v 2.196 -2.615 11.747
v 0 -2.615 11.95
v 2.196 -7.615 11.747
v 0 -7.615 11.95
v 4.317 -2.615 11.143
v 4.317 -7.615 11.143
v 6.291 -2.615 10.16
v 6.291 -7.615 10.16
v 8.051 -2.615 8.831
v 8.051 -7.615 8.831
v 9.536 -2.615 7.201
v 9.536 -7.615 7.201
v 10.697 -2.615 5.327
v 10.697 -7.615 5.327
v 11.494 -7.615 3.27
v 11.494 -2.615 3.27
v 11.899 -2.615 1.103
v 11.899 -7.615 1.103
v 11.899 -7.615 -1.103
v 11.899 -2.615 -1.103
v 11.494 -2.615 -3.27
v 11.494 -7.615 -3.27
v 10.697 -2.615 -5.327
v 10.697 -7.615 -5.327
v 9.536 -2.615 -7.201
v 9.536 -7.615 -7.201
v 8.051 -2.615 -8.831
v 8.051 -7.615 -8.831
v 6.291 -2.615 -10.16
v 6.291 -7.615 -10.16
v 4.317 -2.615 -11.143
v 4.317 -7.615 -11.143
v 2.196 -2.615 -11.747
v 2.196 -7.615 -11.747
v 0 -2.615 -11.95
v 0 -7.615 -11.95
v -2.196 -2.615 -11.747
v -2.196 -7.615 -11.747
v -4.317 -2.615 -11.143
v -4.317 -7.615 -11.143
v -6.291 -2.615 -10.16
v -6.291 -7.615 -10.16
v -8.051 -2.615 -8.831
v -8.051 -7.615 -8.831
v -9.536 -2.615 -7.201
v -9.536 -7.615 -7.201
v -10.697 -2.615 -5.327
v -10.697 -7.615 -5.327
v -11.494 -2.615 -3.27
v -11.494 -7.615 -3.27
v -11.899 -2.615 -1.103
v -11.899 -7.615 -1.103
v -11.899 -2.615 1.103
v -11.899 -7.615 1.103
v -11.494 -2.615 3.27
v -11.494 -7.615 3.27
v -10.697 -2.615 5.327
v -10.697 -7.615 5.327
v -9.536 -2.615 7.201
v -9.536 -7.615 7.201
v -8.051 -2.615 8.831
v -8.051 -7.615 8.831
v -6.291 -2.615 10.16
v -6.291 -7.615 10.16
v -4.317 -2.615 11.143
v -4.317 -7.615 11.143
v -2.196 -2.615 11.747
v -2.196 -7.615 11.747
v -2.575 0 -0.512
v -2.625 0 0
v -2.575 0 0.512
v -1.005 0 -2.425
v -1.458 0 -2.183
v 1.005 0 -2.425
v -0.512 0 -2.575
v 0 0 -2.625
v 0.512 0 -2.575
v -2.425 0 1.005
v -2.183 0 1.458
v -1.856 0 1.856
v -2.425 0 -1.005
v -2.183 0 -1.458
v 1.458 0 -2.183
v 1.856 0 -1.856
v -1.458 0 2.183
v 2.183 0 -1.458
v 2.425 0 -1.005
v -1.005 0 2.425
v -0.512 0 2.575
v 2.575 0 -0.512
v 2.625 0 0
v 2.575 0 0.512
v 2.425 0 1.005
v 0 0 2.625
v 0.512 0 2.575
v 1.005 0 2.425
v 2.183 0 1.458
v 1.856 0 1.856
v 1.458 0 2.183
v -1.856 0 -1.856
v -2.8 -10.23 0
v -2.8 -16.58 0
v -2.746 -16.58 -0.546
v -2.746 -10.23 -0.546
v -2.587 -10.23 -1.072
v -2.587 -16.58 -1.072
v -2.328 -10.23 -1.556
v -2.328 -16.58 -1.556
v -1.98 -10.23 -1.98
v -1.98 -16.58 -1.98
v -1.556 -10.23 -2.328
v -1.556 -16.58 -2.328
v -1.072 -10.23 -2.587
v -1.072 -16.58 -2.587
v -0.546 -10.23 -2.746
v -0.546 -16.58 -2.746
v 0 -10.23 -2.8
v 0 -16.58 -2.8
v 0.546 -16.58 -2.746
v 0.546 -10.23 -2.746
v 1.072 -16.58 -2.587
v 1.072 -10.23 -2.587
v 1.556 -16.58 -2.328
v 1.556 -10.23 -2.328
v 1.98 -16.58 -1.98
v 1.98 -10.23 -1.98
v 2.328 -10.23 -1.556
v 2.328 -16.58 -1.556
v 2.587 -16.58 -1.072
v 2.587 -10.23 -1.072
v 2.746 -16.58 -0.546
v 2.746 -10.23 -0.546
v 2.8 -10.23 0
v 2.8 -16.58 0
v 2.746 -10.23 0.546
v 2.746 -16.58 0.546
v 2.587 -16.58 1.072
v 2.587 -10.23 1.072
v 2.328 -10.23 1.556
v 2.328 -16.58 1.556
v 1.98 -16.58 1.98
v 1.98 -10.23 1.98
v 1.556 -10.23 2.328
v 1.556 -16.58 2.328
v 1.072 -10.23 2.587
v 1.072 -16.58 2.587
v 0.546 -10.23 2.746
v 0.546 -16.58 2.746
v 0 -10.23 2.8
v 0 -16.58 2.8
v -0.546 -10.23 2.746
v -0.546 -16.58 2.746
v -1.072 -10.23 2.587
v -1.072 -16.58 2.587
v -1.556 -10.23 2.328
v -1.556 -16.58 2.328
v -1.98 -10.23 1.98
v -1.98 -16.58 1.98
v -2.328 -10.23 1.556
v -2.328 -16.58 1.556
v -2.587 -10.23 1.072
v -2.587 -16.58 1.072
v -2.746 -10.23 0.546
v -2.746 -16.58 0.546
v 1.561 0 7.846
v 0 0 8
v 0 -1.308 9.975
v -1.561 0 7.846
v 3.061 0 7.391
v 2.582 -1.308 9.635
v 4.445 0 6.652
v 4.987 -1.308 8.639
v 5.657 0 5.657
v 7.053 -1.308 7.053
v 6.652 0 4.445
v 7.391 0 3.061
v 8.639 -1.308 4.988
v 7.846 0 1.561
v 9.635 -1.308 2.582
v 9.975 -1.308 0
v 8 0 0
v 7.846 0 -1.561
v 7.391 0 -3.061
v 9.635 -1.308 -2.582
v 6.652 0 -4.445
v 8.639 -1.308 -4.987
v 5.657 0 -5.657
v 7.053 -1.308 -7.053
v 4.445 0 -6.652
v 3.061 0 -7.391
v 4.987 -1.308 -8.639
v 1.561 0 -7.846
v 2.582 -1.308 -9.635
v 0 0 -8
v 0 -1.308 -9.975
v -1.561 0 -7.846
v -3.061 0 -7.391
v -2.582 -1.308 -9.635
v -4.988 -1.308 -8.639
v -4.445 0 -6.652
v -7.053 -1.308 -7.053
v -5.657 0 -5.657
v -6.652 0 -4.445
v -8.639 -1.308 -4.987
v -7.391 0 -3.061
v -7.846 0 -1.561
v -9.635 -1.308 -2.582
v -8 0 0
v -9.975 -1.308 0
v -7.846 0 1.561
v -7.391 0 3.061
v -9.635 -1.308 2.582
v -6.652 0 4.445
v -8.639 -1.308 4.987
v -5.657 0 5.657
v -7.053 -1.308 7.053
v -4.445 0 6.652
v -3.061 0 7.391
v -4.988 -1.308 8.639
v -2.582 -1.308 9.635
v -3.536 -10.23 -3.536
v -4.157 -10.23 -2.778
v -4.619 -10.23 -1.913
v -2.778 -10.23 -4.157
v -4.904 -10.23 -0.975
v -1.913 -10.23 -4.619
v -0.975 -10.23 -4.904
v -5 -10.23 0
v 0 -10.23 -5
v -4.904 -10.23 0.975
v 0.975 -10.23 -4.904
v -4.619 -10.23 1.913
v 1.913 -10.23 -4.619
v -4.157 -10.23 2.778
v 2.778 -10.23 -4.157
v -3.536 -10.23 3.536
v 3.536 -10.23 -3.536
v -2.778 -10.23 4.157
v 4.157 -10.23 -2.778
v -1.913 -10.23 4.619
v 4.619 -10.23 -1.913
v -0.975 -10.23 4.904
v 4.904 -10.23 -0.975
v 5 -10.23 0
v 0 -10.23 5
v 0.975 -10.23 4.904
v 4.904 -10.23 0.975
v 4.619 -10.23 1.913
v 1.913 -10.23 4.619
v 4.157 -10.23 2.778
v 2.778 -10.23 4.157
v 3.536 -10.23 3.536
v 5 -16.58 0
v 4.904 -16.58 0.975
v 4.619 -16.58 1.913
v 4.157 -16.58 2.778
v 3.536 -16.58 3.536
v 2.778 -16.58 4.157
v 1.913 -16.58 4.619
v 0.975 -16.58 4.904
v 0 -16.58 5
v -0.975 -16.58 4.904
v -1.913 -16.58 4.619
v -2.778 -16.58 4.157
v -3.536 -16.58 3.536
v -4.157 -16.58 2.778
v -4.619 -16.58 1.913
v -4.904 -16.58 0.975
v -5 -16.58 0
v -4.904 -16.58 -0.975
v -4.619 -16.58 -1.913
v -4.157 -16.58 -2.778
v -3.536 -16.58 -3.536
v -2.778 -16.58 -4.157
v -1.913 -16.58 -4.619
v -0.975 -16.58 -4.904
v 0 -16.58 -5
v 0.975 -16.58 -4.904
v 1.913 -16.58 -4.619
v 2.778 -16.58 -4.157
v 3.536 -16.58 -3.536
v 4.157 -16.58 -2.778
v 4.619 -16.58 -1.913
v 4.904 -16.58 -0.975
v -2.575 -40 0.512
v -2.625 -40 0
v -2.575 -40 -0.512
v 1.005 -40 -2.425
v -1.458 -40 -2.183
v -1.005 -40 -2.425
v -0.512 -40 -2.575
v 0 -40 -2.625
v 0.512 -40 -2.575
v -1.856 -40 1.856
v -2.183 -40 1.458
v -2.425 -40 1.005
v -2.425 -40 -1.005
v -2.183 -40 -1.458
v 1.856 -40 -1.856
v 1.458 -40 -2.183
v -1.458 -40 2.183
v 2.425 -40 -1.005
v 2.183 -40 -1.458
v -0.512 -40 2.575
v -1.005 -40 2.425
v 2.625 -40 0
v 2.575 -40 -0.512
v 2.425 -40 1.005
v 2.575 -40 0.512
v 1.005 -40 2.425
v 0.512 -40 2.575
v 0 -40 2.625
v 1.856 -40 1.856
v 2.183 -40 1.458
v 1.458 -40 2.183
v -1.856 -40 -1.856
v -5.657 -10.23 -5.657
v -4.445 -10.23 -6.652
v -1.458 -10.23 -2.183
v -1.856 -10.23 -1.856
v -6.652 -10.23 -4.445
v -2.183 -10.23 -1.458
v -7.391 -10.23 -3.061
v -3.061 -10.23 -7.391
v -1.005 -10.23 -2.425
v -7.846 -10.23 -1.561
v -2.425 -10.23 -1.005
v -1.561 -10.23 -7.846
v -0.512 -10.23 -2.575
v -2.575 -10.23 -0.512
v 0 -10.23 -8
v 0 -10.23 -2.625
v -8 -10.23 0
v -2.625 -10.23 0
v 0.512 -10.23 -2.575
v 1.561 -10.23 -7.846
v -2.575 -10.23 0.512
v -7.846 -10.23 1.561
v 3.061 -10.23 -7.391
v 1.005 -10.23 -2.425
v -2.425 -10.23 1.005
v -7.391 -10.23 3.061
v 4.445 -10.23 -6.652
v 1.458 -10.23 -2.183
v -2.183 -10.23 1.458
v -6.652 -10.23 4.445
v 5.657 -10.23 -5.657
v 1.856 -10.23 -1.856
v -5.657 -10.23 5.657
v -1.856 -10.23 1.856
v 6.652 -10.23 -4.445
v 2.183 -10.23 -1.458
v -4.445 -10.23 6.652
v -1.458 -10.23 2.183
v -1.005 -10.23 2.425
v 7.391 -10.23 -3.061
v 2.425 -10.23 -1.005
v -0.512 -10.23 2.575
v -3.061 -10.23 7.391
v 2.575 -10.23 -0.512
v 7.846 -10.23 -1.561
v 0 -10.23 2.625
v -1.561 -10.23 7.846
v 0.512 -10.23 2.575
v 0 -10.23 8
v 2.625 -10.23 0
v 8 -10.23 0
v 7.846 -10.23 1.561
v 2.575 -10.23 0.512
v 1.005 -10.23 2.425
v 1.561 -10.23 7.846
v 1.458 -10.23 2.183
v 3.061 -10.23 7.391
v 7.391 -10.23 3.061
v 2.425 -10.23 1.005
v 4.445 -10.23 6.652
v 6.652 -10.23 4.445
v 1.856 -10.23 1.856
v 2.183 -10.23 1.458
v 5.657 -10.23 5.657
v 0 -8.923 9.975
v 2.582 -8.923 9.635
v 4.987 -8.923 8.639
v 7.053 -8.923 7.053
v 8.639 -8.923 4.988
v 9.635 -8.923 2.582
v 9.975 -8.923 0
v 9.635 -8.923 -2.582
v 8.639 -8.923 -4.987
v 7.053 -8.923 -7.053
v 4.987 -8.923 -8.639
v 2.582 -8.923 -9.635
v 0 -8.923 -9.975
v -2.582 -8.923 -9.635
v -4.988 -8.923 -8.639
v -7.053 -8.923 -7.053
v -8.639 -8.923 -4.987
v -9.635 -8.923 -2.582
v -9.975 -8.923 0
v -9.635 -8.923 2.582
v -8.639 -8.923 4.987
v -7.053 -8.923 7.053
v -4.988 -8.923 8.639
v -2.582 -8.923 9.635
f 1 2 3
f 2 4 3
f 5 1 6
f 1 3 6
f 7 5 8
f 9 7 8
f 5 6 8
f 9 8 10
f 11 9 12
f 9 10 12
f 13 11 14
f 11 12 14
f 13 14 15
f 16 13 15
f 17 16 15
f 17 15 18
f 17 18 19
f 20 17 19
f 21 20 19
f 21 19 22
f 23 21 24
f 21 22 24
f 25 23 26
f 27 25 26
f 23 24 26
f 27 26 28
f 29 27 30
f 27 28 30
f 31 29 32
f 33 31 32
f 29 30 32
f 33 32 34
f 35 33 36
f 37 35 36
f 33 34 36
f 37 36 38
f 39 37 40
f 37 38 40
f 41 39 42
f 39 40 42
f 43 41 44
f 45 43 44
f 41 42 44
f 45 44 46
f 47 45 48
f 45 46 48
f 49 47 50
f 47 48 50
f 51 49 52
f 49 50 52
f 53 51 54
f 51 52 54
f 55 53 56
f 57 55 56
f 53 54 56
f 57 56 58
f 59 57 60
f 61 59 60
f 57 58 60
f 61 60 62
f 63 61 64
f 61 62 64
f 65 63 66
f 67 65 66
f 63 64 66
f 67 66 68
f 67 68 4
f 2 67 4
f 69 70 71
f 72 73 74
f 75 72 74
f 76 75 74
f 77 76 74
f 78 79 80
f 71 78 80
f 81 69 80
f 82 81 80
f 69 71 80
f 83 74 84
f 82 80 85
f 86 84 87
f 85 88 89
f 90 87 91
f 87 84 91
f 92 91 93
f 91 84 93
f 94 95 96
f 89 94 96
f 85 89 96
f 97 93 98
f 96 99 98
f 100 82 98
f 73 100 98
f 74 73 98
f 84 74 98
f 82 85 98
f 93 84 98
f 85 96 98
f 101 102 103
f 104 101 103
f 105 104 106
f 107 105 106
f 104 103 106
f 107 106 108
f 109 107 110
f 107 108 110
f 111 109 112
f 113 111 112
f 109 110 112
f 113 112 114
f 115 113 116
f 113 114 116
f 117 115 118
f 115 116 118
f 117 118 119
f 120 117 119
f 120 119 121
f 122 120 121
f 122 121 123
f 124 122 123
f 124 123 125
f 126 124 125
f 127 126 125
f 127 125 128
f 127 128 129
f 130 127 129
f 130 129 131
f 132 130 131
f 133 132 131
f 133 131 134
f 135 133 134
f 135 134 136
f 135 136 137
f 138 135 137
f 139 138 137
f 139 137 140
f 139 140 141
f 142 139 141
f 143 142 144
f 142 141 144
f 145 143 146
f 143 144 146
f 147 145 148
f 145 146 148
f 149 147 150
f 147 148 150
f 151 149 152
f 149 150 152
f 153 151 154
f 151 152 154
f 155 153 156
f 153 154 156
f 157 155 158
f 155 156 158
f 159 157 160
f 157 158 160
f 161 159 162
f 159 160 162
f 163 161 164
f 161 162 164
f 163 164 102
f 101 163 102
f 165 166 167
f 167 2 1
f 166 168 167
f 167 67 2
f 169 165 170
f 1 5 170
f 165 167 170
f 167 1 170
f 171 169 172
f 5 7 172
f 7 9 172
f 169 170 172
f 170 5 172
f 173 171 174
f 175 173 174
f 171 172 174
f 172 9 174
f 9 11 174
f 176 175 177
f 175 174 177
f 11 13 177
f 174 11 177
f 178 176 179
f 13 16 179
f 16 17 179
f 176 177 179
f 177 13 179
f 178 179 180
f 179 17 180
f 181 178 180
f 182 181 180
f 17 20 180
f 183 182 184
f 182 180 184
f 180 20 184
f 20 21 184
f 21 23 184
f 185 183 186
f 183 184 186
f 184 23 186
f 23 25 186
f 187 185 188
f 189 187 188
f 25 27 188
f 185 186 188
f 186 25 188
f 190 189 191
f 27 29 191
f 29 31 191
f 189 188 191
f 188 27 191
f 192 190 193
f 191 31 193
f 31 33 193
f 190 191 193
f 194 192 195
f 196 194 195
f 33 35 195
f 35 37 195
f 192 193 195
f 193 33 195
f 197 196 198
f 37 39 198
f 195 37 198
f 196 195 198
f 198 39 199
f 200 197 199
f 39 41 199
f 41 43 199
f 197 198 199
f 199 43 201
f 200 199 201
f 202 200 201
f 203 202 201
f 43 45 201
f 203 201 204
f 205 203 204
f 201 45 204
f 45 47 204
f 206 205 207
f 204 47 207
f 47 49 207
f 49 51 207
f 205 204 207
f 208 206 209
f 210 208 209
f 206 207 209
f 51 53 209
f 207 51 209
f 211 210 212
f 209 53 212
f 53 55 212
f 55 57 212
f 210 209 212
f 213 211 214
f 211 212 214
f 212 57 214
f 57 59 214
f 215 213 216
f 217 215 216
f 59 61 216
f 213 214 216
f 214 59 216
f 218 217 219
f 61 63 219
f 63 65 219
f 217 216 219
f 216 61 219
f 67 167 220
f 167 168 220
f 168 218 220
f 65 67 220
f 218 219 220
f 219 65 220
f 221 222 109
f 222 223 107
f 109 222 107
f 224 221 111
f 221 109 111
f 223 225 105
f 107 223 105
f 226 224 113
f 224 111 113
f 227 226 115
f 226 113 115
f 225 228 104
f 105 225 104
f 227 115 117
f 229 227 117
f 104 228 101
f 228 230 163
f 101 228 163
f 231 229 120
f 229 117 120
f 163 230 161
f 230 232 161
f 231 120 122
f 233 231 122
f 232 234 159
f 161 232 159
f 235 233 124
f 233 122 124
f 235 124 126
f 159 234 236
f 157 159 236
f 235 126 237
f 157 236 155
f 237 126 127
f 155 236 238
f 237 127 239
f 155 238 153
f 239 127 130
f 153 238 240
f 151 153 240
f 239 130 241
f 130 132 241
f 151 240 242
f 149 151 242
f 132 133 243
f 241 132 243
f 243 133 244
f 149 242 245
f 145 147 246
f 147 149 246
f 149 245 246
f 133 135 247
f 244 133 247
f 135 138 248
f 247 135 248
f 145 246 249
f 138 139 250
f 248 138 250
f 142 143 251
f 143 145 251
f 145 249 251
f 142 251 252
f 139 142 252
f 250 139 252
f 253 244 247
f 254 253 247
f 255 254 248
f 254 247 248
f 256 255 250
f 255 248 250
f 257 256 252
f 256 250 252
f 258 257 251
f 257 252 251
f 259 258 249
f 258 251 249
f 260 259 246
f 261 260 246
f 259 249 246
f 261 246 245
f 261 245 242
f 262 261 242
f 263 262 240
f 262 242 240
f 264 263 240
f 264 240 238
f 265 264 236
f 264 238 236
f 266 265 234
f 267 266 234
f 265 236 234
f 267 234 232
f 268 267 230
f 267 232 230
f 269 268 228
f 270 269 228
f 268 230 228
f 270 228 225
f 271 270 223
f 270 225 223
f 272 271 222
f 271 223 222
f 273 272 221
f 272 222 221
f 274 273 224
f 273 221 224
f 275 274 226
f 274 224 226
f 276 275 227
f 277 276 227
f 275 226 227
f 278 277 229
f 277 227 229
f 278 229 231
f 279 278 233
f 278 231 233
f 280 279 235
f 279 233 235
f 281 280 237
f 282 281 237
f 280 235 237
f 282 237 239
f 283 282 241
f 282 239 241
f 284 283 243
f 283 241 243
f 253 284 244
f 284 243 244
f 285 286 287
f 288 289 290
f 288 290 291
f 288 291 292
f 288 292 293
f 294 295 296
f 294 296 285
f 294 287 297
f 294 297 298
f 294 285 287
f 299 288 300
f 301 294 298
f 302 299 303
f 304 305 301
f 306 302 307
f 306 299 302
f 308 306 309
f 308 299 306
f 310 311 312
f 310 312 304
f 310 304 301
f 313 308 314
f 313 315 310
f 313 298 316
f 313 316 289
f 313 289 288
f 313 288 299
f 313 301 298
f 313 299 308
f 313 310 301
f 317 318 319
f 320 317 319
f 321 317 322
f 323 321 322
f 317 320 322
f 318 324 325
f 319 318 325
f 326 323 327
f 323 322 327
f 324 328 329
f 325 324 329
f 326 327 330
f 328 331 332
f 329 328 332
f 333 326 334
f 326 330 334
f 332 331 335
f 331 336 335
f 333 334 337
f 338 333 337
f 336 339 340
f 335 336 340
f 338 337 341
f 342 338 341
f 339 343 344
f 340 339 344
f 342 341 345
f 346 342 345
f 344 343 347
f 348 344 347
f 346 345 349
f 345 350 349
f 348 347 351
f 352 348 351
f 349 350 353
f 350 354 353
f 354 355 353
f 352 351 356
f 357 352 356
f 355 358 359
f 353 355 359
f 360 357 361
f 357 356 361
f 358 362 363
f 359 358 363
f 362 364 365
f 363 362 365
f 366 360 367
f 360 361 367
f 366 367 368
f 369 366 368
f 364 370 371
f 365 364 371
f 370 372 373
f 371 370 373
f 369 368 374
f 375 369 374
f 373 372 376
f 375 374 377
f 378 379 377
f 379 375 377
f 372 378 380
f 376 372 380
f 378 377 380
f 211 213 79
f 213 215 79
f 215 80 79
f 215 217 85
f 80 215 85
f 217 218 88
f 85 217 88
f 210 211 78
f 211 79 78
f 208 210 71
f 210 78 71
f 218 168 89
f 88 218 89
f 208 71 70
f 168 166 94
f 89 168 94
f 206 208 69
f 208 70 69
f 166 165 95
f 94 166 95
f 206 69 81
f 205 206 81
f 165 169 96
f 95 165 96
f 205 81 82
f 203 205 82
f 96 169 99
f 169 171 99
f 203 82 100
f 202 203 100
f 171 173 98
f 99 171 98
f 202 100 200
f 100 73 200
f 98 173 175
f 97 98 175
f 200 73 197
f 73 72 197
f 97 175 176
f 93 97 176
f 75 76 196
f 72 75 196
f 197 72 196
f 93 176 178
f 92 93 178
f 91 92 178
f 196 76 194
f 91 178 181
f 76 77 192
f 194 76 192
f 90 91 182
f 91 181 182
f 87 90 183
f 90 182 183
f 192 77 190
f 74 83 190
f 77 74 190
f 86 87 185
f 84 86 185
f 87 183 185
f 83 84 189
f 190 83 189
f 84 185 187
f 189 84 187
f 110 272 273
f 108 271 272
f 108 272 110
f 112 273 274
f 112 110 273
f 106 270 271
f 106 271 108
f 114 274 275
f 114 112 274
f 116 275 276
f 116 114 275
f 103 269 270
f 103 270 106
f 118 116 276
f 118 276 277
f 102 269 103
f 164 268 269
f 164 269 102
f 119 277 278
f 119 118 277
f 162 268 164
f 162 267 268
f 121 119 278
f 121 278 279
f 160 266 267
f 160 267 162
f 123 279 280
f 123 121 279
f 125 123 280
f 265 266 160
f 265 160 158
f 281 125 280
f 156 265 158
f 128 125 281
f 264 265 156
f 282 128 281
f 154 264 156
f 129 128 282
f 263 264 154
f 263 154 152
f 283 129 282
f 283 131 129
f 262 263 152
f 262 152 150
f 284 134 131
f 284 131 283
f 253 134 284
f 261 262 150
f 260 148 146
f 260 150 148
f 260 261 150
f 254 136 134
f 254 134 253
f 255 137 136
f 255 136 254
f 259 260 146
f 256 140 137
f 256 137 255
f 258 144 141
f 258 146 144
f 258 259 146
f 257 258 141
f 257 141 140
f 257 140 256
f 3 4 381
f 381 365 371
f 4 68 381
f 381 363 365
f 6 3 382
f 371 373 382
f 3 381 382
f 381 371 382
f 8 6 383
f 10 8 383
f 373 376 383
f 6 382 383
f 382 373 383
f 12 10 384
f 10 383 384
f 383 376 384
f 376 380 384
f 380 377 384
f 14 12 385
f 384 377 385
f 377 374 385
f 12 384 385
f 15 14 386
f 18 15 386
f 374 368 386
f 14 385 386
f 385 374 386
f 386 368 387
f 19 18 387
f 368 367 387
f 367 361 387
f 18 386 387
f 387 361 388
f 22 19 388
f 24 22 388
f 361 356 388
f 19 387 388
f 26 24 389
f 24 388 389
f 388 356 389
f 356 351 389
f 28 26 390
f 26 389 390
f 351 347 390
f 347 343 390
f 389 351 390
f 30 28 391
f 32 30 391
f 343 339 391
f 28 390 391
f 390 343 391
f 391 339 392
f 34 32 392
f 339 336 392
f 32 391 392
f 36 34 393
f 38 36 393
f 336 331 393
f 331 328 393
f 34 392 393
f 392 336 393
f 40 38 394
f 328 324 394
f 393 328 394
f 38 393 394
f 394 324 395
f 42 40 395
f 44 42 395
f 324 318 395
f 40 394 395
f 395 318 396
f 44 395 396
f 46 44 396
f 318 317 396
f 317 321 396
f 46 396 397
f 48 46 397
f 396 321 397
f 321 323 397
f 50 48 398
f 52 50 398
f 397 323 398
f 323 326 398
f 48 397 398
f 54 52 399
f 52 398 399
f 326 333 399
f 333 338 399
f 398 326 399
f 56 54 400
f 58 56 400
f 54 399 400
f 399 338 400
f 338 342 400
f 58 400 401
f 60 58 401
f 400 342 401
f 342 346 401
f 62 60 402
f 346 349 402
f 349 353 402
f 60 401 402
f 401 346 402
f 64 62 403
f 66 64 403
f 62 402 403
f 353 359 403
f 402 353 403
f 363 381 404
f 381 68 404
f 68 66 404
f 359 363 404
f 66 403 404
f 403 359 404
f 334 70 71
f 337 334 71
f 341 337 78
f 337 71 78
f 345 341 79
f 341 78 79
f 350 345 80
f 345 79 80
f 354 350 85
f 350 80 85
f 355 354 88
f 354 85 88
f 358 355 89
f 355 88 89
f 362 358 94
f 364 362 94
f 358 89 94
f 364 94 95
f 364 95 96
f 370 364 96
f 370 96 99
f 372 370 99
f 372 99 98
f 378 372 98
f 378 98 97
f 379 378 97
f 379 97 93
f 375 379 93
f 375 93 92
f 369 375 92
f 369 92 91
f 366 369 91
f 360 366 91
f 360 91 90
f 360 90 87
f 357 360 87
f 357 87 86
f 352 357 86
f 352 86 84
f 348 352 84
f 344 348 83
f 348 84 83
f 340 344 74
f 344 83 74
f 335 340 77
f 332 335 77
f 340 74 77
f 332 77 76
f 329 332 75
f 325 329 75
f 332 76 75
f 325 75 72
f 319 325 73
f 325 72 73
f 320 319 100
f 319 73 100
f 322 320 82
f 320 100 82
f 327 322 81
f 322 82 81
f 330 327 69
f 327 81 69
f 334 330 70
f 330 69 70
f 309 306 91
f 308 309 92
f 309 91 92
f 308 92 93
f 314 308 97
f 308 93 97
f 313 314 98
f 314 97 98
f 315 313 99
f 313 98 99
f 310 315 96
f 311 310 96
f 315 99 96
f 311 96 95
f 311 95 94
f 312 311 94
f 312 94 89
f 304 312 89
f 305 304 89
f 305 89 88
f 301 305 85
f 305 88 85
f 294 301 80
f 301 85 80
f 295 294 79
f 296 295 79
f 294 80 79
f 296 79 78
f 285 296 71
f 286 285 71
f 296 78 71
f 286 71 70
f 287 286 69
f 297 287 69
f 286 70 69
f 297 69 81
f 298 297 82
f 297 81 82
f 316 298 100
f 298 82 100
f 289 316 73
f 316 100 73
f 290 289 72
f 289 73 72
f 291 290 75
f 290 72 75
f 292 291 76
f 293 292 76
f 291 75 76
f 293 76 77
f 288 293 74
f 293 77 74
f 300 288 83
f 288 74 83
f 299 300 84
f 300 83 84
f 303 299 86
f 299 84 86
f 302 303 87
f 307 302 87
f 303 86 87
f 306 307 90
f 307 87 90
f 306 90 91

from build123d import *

# Parameters (mm, degrees)
F3_D     = 5.25
F4_R     = 2.625
F5_DEPTH = 40
F6_R     = 5
F6_R_2   = 2.625
F7_DEPTH = 6.35
F8_D     = 5.6


with BuildPart() as f1:
    # F0 (on Right) → F1 (revolve)
    with BuildSketch(Plane.YZ):
        Polygon((0, 8), (-2.615, 11.95), (-7.615, 11.95), (-10.23, 8), (-10.23, 0), (0, 0), align=None)
    revolve(axis=Axis((0, -5.115, 0), (0, 1, 0)))

    # F3 (through all)
    with Locations(Plane.XZ.offset(10.23)):
        with Locations((0, 0)):
            Hole(F3_D / 2)


with BuildPart() as f5:
    # F4 (on Front) → F5 (new body)
    with BuildSketch(Plane.XZ):
        Circle(F4_R)
    extrude(amount=F5_DEPTH)


with BuildPart() as f7:
    # F6 (on face) → F7 (new body)
    with BuildSketch(Plane.XZ.offset(10.23)):
        Circle(F6_R)
        Circle(F6_R_2, mode=Mode.SUBTRACT)
    extrude(amount=F7_DEPTH)

    # F8 (through all)
    with Locations(Plane(origin=(0, -10.23, 0), x_dir=(1, 0, 0), z_dir=(0, 1, 0))):
        with Locations((0, 0)):
            Hole(F8_D / 2)


solid = Compound([f1.part, f5.part, f7.part])
